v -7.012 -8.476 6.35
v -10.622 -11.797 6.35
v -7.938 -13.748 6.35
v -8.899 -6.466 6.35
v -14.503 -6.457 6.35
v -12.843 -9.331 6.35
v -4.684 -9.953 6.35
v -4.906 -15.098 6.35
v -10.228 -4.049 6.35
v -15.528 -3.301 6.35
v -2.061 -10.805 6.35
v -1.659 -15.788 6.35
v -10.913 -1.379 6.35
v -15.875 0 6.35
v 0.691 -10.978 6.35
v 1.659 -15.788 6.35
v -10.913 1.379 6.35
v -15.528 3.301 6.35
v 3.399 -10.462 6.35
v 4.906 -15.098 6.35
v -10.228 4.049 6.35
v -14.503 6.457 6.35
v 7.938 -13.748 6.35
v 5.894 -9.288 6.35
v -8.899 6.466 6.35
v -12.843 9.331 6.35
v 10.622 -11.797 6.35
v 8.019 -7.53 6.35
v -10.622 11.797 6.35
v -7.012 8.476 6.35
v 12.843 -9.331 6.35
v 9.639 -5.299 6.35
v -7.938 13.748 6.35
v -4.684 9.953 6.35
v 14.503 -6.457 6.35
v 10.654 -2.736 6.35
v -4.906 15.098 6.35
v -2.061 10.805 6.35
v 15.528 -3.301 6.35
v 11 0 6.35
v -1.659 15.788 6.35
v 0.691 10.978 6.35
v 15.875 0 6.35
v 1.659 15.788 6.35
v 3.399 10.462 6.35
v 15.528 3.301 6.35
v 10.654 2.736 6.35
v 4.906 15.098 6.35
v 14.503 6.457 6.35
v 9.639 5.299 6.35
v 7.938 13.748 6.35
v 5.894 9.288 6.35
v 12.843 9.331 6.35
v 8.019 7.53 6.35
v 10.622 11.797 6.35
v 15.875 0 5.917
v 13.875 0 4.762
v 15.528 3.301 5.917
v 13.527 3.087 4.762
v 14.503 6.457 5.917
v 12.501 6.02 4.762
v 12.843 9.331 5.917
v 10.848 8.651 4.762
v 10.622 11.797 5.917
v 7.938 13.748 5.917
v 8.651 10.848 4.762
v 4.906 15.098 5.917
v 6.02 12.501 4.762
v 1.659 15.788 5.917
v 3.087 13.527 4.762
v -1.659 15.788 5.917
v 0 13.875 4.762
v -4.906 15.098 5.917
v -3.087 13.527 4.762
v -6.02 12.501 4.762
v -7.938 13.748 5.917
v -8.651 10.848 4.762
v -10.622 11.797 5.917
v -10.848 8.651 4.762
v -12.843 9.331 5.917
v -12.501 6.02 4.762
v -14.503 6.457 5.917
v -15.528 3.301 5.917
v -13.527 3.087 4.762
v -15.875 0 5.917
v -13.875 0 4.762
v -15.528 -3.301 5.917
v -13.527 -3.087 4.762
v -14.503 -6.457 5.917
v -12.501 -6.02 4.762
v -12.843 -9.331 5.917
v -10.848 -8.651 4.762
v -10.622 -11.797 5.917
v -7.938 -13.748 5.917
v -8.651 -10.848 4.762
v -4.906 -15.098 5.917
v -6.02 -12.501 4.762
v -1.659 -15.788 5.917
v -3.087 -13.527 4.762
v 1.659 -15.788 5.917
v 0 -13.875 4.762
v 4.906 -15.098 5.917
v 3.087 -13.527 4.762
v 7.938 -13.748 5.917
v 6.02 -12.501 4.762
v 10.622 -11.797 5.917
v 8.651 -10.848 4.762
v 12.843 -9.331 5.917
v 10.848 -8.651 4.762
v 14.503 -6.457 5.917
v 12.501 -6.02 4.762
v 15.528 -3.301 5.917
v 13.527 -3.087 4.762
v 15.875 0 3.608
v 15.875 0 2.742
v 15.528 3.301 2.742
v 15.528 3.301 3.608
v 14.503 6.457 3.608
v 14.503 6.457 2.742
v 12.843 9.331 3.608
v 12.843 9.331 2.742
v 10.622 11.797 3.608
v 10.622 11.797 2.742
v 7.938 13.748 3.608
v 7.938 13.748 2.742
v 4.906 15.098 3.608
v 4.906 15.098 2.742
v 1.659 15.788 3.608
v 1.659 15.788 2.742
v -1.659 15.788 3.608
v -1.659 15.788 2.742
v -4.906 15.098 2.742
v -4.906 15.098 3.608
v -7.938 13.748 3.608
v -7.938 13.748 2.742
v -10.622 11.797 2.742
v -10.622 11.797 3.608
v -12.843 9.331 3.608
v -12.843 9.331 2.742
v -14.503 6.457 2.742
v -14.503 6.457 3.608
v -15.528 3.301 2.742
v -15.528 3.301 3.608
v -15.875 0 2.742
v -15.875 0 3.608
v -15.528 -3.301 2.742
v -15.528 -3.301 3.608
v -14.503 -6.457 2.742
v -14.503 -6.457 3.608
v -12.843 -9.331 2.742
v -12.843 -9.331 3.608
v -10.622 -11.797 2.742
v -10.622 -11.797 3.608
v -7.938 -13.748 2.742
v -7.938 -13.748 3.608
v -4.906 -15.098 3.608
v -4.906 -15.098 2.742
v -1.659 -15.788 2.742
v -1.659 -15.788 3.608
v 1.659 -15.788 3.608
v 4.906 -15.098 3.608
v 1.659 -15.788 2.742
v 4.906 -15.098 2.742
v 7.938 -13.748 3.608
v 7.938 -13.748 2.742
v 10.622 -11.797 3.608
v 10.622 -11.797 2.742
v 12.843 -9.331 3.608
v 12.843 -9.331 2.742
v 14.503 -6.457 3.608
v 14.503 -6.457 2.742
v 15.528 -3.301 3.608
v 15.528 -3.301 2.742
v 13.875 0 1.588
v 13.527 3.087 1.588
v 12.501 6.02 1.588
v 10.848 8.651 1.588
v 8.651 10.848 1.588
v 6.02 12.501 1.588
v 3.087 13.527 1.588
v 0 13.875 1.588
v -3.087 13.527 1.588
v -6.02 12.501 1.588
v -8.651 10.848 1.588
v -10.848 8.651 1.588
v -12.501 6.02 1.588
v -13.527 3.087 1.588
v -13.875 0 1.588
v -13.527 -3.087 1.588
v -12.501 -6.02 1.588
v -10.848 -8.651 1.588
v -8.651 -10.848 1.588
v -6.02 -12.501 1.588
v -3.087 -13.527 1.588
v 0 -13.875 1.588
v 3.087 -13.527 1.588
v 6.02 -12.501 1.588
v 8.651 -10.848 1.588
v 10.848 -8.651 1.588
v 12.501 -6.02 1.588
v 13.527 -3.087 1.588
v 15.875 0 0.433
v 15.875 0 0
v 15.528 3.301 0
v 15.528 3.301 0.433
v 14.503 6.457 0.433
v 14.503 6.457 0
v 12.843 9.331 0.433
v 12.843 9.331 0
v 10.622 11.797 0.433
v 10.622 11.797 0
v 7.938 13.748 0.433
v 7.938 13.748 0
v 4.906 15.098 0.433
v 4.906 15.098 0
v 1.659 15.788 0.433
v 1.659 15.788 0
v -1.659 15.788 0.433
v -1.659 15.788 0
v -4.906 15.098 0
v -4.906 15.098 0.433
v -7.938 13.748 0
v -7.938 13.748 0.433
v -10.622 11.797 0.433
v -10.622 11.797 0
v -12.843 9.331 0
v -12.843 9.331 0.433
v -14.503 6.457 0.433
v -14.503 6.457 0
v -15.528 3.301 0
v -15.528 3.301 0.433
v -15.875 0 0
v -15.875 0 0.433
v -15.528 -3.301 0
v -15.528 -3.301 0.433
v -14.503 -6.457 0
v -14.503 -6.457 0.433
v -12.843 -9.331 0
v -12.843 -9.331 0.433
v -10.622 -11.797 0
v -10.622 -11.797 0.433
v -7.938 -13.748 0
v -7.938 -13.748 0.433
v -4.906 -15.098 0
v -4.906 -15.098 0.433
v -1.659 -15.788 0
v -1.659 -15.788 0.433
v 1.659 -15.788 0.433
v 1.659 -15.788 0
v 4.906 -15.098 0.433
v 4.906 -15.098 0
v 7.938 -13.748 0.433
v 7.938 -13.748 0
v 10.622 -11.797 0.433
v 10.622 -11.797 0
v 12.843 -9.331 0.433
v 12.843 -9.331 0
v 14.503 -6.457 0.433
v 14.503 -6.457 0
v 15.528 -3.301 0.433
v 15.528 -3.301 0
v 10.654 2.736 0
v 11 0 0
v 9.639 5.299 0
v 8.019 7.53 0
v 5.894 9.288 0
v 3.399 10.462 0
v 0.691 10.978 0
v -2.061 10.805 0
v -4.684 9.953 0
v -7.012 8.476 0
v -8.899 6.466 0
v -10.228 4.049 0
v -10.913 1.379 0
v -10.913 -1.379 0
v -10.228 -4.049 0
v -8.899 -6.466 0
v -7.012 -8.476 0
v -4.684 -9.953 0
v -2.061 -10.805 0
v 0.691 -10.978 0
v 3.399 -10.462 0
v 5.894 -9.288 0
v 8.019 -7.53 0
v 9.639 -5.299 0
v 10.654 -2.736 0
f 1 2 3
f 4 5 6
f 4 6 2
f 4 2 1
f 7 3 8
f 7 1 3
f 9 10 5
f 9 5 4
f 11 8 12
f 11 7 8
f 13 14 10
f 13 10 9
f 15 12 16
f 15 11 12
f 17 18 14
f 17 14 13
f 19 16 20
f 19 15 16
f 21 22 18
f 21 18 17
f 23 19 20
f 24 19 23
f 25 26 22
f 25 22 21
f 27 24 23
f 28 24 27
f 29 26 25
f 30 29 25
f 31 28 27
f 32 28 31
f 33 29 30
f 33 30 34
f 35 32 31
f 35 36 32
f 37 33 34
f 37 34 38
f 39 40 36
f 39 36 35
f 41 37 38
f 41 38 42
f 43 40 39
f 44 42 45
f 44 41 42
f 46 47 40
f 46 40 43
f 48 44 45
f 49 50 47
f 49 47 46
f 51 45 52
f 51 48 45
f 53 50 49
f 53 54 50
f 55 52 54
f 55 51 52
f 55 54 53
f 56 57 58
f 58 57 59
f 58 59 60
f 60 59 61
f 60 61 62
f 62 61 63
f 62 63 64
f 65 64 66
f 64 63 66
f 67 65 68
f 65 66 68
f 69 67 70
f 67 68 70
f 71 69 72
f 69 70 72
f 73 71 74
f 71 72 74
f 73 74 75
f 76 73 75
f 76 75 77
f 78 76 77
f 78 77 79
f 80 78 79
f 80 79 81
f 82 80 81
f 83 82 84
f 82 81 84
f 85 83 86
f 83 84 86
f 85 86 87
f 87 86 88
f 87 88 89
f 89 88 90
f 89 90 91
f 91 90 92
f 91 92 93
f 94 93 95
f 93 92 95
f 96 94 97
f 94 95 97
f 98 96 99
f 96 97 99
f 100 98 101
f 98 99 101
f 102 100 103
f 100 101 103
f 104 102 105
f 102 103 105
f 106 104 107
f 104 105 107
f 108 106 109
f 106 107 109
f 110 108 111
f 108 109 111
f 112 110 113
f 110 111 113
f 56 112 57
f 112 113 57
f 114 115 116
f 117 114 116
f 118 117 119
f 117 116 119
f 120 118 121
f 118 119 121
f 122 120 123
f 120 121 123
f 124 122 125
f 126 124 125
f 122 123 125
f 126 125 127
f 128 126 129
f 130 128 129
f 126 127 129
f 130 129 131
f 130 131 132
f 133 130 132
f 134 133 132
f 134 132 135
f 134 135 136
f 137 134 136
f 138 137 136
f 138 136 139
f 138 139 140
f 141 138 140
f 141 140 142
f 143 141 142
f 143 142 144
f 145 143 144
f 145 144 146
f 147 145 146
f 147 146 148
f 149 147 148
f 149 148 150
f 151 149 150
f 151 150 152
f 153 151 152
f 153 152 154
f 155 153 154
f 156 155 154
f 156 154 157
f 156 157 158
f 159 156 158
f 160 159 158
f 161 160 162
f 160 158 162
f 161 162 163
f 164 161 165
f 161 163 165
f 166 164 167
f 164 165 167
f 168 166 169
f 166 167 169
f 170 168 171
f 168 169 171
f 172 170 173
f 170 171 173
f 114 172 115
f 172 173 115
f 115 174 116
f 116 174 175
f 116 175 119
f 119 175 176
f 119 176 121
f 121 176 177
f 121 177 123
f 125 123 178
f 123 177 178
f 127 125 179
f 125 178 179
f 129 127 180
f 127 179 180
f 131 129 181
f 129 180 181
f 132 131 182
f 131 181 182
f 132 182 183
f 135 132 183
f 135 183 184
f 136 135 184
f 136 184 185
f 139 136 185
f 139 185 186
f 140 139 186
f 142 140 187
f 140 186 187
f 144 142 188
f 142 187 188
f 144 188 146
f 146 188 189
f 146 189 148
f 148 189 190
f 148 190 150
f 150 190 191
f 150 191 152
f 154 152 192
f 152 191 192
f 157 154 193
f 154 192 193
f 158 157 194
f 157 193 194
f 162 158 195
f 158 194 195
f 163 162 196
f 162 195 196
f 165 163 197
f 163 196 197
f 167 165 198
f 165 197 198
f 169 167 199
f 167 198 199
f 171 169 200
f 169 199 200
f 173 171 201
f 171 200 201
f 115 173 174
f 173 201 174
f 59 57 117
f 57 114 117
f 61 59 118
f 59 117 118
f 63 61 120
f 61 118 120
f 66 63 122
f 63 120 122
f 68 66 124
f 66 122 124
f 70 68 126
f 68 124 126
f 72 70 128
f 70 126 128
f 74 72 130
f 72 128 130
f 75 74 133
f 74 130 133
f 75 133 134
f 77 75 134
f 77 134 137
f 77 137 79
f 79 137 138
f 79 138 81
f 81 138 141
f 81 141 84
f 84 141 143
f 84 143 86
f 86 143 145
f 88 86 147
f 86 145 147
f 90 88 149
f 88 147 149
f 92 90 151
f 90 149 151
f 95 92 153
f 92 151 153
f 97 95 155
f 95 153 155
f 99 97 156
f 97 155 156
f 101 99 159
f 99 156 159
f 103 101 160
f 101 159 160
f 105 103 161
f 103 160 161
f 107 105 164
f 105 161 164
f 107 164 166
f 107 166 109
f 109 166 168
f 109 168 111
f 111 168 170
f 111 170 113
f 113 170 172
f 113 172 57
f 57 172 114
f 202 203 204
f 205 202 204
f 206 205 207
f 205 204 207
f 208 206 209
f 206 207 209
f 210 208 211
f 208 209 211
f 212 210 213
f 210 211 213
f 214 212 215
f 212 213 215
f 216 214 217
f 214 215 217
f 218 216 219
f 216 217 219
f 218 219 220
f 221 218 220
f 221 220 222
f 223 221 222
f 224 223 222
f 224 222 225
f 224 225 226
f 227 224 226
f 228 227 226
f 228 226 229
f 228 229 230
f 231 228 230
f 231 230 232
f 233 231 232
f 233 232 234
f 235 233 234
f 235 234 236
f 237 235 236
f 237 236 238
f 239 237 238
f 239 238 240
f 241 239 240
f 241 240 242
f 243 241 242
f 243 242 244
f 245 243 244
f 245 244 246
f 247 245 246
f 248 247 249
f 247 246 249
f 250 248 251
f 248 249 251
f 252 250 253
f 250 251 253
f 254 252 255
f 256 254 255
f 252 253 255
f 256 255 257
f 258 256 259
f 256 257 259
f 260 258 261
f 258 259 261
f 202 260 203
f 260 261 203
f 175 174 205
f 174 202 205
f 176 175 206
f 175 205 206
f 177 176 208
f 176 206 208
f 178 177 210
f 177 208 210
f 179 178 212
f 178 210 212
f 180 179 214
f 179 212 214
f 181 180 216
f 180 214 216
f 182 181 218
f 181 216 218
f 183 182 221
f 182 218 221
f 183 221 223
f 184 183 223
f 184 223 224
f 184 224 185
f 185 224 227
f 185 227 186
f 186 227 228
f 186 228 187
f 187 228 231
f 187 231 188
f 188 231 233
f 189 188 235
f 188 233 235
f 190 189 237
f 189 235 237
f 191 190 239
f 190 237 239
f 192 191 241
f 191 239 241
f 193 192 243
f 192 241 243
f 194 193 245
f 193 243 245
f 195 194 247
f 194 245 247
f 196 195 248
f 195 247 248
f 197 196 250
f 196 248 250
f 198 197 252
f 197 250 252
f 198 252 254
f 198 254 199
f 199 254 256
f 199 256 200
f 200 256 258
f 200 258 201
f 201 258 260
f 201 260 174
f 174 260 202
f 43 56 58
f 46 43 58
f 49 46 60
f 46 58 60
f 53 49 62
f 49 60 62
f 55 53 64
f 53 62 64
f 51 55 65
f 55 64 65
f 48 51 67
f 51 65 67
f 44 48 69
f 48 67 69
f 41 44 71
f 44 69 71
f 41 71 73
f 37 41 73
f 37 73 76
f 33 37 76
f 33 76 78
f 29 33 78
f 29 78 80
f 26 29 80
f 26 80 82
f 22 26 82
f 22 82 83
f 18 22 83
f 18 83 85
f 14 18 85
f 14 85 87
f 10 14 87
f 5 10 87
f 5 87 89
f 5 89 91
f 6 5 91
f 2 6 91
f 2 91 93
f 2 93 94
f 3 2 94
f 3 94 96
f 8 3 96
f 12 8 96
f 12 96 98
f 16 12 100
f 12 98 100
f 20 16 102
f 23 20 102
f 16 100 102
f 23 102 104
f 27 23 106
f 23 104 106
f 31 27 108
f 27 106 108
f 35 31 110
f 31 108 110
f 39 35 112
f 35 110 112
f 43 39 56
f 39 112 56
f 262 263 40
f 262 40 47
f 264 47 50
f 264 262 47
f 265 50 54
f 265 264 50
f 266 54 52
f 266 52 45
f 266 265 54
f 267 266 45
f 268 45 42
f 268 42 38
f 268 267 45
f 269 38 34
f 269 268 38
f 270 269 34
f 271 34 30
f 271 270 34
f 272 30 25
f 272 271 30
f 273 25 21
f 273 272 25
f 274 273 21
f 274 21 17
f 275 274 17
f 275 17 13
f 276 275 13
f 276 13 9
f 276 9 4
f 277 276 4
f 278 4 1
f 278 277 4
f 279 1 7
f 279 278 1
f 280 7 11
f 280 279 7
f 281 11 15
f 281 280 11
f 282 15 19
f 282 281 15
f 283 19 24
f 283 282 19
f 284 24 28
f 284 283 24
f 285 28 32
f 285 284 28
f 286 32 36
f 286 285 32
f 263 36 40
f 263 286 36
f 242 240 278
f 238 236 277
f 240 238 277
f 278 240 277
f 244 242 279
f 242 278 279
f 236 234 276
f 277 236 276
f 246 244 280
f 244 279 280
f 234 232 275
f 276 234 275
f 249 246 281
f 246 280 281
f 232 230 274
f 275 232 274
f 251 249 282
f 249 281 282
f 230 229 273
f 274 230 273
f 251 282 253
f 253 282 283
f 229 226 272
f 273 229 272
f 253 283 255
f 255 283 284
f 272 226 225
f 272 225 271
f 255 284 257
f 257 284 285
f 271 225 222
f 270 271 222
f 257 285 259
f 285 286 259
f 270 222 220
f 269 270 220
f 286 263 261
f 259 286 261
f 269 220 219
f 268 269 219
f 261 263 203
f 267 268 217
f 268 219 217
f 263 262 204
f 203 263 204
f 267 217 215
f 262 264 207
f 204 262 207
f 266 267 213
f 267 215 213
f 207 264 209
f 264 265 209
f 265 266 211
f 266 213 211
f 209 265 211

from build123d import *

# Parameters (mm, degrees)
F0_R     = 15.875
F0_R_2   = 11
F1_DEPTH = 6.35


# Not quite as in the source:
# - a length typed as a fraction of an inch, garbled in the dataset ("3 / 203.2 mm" for 3/8 in), is restored


with BuildPart() as f1:
    # F0 (on Top) → F1 (new body)
    with BuildSketch(Plane.XY):
        Circle(F0_R)
        Circle(F0_R_2, mode=Mode.SUBTRACT)
    extrude(amount=F1_DEPTH)

    # F2 (on Front) → F3 (revolve, cut)
    with BuildSketch(Plane.XZ):
        Polygon((15.875, 0.4327994616), (15.875, 2.7422005384), (13.875, 1.5875), align=None)
        Polygon((15.875, 5.9172005384), (13.875, 4.7625), (15.875, 3.6077994616), align=None)
    revolve(axis=Axis((0, 0, 9.5765832812), (0, 0, 1)), mode=Mode.SUBTRACT)


solid = f1.part
